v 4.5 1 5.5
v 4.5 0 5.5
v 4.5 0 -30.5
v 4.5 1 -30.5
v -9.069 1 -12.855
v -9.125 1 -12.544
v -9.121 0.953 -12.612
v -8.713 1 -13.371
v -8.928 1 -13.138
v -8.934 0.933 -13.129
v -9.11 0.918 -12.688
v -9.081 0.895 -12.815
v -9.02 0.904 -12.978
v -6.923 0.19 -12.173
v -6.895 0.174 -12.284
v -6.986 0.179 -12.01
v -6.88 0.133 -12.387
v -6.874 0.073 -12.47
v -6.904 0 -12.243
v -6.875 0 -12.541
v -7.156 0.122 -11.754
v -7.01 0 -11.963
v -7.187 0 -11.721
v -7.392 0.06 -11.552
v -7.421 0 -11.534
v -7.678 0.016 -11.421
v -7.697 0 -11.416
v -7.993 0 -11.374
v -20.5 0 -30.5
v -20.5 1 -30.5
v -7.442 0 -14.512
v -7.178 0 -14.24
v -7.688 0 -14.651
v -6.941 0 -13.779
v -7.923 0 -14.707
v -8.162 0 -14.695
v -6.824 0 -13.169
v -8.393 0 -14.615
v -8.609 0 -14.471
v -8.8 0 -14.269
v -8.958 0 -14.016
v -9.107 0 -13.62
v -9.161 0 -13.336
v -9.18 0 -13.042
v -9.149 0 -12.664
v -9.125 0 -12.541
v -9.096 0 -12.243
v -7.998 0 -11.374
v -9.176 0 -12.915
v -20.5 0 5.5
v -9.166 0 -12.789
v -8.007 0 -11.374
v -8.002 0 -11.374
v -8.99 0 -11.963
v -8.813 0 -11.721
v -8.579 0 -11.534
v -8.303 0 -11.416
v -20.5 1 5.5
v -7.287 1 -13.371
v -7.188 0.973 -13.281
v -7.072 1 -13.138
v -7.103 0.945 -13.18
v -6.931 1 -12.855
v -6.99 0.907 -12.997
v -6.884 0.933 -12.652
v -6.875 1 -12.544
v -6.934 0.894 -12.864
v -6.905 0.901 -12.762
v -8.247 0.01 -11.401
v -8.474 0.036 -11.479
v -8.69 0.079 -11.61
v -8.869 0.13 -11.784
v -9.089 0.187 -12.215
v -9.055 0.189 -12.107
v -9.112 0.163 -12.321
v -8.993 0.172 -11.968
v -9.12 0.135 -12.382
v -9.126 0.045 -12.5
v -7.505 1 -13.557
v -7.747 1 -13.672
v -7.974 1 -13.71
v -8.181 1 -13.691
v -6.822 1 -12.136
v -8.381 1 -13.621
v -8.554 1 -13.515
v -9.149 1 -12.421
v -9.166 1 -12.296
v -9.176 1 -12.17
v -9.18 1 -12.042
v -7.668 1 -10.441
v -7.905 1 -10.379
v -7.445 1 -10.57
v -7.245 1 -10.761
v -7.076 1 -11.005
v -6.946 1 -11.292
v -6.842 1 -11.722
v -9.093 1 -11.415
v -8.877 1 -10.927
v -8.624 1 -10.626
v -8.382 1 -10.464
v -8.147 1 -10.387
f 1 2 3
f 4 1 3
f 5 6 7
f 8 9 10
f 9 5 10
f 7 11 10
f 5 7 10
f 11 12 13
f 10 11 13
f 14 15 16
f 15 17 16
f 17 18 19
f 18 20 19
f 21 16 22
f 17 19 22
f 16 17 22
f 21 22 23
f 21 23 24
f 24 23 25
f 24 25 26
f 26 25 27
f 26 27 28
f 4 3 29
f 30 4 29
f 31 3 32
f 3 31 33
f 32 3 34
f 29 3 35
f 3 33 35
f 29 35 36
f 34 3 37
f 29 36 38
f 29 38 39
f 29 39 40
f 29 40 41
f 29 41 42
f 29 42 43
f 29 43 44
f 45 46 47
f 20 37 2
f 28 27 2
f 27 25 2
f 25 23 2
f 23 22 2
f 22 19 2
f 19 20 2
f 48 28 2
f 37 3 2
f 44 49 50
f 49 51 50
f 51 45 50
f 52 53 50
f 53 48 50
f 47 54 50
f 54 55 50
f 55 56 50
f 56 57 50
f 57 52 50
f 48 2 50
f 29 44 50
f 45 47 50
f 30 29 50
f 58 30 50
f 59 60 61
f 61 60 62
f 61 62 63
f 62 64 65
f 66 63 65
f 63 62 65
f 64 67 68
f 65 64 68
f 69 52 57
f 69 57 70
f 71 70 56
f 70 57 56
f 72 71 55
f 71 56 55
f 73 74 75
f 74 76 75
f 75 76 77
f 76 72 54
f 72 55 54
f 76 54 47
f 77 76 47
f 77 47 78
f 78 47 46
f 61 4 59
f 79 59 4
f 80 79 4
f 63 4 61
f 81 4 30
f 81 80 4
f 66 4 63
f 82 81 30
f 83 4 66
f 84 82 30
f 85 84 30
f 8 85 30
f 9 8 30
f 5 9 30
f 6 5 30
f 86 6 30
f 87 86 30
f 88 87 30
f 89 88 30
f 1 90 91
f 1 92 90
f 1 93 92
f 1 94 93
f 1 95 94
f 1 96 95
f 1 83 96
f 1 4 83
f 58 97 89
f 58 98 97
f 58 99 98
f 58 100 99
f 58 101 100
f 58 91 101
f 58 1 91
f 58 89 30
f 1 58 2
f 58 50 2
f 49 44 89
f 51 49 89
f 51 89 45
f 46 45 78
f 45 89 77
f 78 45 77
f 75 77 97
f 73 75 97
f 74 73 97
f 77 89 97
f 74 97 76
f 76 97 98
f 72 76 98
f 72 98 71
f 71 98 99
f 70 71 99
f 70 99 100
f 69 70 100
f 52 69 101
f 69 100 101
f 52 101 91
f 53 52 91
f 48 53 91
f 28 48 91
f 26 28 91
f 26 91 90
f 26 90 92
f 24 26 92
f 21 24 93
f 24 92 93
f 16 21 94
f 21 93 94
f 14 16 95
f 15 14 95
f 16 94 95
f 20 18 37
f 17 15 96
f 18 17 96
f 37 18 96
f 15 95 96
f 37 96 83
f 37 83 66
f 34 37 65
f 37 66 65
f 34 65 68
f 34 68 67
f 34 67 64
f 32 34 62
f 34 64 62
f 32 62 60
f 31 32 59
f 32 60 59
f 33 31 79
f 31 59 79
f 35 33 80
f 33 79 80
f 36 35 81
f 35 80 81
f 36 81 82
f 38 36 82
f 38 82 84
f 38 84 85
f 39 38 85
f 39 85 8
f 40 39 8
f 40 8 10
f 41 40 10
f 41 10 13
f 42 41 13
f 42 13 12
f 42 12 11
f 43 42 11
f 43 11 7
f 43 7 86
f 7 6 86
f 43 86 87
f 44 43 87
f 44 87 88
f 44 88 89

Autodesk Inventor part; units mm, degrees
ref_plane "YZ Plane" through (0, 0, 0) normal (1, 0, 0) x (0, 1, 0)
ref_plane "XZ Plane" through (0, 0, 0) normal (0, 1, 0) x (-1, 0, 0)
ref_plane "XY Plane" through (0, 0, 0) normal (0, 0, 1) x (1, 0, 0)
sketch "Sketch1" plane through (0, 0, 0) normal (0, 1, 0) x (-1, 0, 0)
  circle A0 centre (8, -12.5) radius 1.1261
  line L0 (-4.5, -30.5) -> (20.5, -30.5)
  line L1 (20.5, -30.5) -> (20.5, 5.5)
  line L2 (20.5, 5.5) -> (-4.5, 5.5)
  line L3 (-4.5, 5.5) -> (-4.5, -30.5)
  line L4 (-4.5, -30.5) -> (20.5, 5.5) construction
  line L5 (20.5, -30.5) -> (-4.5, 5.5) construction
  dimension "d7" = 25
  dimension "d8" = 36
extrude "Extrusion1" add sketch "Sketch1" along normal blind 1
ref_plane "Work Plane1" through (16.9, 36.305, -11.9513) normal (0, 0.7071, 0.7071) x (-1, 0, 0)
sketch "Sketch2" plane through (16.9, 36.305, -11.9513) normal (0, 0.7071, 0.7071) x (-1, 0, 0)
  ellipse E0 centre (24.9, 24.5764) end of major axis (23.7739, 24.5764) minor radius 0.7963 projected
  circle A0 centre (24.9, 24.9) radius 1.1798
  ellipse E1 centre (24.9, 25.2835) end of major axis (23.7739, 25.2835) minor radius 0.7963 projected
  point P0 (16.9, 34.1223)
  dimension "d4" = 0.3236
extrude "Extrusion2" cut sketch "Sketch2" against normal through all contours E0 E1 A0 | E0 A0 E1 | E1 A0 E0 | E0 E1 | E0 A0 | E1 A0 E0 picked at (24.9476, 23.7672)
properties part number "00_Comar_Dichroic_16x25x0.2" material "Glas"
